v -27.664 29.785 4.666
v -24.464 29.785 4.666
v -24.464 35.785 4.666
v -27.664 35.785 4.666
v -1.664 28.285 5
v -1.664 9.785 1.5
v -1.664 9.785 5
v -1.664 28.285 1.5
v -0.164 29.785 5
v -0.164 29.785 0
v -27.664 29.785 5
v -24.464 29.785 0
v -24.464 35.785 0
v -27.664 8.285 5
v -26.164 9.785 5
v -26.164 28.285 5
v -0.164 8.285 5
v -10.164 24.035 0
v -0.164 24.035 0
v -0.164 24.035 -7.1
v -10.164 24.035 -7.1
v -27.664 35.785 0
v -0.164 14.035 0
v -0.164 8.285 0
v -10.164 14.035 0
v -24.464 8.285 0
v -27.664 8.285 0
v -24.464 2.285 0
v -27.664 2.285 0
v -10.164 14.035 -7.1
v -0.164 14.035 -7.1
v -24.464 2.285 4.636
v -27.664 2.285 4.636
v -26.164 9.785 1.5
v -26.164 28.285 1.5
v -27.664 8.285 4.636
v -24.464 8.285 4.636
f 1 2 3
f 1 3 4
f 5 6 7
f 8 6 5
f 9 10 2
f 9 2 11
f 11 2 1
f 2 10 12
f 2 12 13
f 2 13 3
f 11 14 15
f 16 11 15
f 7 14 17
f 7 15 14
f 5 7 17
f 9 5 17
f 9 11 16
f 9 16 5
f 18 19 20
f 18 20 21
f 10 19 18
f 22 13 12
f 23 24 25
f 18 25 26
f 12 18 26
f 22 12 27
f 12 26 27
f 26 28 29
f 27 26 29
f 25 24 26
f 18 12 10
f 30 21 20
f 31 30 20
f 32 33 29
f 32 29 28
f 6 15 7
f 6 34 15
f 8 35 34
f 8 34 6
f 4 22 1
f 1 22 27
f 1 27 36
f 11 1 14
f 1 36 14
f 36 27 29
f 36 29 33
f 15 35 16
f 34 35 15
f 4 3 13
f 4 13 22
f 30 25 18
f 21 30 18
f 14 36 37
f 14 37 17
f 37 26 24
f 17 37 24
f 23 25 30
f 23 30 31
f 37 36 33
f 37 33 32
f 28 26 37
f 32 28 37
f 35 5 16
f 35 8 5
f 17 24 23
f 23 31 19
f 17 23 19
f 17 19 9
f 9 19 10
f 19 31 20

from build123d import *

# Parameters (mm, degrees)
F1_DEPTH = 5
F2_T     = -1.5
F3_W     = 8.5
F3_H     = 10
F3_W_2   = 1.5
F4_DEPTH = 8.6
F5_W     = 3.2
F5_H     = 4.6355582315
F6_DEPTH = 6
F7_W     = 3.2
F7_H     = 4.6664974656
F8_DEPTH = 6


with BuildPart() as f1:
    # F0 (on Top) → F1 (new body)
    with BuildSketch(Plane.XY):
        Polygon((-0.1638537049, 29.7847446054), (-27.6638537049, 29.7847446054), (-27.6638537049, 19.0347446054), (-27.6638537049, 8.2847446054), (-0.1638537049, 8.2847446054), align=None)
    extrude(amount=F1_DEPTH)

    # F2
    f2_openings = [f1.faces().sort_by_distance(p)[0] for p in [
        (-13.913854, 19.034745, 5),
    ]]
    offset(amount=F2_T, openings=f2_openings)

    # F3 (on face) → F4 (join)
    with BuildSketch(Plane.XY.offset(1.5)):
        with Locations((-5.9138537049, 19.0347446054)):
            Rectangle(F3_W, F3_H)
        with Locations((-0.9138537049, 19.0347446054)):
            Rectangle(F3_W_2, F3_H)
    extrude(amount=-F4_DEPTH)

    # F5 (on face) → F6 (join)
    with BuildSketch(Plane.XZ.offset(-8.2847446054)):
        with Locations((-26.0638537049, 2.3177791158)):
            Rectangle(F5_W, F5_H)
    extrude(amount=F6_DEPTH)

    # F7 (on face) → F8 (join)
    with BuildSketch(Plane(origin=(0, 29.7847446054, 0), x_dir=(-1, 0, 0), z_dir=(0, 1, 0))):
        with Locations((26.0638537049, 2.3332487328)):
            Rectangle(F7_W, F7_H)
    extrude(amount=F8_DEPTH)


solid = f1.part
